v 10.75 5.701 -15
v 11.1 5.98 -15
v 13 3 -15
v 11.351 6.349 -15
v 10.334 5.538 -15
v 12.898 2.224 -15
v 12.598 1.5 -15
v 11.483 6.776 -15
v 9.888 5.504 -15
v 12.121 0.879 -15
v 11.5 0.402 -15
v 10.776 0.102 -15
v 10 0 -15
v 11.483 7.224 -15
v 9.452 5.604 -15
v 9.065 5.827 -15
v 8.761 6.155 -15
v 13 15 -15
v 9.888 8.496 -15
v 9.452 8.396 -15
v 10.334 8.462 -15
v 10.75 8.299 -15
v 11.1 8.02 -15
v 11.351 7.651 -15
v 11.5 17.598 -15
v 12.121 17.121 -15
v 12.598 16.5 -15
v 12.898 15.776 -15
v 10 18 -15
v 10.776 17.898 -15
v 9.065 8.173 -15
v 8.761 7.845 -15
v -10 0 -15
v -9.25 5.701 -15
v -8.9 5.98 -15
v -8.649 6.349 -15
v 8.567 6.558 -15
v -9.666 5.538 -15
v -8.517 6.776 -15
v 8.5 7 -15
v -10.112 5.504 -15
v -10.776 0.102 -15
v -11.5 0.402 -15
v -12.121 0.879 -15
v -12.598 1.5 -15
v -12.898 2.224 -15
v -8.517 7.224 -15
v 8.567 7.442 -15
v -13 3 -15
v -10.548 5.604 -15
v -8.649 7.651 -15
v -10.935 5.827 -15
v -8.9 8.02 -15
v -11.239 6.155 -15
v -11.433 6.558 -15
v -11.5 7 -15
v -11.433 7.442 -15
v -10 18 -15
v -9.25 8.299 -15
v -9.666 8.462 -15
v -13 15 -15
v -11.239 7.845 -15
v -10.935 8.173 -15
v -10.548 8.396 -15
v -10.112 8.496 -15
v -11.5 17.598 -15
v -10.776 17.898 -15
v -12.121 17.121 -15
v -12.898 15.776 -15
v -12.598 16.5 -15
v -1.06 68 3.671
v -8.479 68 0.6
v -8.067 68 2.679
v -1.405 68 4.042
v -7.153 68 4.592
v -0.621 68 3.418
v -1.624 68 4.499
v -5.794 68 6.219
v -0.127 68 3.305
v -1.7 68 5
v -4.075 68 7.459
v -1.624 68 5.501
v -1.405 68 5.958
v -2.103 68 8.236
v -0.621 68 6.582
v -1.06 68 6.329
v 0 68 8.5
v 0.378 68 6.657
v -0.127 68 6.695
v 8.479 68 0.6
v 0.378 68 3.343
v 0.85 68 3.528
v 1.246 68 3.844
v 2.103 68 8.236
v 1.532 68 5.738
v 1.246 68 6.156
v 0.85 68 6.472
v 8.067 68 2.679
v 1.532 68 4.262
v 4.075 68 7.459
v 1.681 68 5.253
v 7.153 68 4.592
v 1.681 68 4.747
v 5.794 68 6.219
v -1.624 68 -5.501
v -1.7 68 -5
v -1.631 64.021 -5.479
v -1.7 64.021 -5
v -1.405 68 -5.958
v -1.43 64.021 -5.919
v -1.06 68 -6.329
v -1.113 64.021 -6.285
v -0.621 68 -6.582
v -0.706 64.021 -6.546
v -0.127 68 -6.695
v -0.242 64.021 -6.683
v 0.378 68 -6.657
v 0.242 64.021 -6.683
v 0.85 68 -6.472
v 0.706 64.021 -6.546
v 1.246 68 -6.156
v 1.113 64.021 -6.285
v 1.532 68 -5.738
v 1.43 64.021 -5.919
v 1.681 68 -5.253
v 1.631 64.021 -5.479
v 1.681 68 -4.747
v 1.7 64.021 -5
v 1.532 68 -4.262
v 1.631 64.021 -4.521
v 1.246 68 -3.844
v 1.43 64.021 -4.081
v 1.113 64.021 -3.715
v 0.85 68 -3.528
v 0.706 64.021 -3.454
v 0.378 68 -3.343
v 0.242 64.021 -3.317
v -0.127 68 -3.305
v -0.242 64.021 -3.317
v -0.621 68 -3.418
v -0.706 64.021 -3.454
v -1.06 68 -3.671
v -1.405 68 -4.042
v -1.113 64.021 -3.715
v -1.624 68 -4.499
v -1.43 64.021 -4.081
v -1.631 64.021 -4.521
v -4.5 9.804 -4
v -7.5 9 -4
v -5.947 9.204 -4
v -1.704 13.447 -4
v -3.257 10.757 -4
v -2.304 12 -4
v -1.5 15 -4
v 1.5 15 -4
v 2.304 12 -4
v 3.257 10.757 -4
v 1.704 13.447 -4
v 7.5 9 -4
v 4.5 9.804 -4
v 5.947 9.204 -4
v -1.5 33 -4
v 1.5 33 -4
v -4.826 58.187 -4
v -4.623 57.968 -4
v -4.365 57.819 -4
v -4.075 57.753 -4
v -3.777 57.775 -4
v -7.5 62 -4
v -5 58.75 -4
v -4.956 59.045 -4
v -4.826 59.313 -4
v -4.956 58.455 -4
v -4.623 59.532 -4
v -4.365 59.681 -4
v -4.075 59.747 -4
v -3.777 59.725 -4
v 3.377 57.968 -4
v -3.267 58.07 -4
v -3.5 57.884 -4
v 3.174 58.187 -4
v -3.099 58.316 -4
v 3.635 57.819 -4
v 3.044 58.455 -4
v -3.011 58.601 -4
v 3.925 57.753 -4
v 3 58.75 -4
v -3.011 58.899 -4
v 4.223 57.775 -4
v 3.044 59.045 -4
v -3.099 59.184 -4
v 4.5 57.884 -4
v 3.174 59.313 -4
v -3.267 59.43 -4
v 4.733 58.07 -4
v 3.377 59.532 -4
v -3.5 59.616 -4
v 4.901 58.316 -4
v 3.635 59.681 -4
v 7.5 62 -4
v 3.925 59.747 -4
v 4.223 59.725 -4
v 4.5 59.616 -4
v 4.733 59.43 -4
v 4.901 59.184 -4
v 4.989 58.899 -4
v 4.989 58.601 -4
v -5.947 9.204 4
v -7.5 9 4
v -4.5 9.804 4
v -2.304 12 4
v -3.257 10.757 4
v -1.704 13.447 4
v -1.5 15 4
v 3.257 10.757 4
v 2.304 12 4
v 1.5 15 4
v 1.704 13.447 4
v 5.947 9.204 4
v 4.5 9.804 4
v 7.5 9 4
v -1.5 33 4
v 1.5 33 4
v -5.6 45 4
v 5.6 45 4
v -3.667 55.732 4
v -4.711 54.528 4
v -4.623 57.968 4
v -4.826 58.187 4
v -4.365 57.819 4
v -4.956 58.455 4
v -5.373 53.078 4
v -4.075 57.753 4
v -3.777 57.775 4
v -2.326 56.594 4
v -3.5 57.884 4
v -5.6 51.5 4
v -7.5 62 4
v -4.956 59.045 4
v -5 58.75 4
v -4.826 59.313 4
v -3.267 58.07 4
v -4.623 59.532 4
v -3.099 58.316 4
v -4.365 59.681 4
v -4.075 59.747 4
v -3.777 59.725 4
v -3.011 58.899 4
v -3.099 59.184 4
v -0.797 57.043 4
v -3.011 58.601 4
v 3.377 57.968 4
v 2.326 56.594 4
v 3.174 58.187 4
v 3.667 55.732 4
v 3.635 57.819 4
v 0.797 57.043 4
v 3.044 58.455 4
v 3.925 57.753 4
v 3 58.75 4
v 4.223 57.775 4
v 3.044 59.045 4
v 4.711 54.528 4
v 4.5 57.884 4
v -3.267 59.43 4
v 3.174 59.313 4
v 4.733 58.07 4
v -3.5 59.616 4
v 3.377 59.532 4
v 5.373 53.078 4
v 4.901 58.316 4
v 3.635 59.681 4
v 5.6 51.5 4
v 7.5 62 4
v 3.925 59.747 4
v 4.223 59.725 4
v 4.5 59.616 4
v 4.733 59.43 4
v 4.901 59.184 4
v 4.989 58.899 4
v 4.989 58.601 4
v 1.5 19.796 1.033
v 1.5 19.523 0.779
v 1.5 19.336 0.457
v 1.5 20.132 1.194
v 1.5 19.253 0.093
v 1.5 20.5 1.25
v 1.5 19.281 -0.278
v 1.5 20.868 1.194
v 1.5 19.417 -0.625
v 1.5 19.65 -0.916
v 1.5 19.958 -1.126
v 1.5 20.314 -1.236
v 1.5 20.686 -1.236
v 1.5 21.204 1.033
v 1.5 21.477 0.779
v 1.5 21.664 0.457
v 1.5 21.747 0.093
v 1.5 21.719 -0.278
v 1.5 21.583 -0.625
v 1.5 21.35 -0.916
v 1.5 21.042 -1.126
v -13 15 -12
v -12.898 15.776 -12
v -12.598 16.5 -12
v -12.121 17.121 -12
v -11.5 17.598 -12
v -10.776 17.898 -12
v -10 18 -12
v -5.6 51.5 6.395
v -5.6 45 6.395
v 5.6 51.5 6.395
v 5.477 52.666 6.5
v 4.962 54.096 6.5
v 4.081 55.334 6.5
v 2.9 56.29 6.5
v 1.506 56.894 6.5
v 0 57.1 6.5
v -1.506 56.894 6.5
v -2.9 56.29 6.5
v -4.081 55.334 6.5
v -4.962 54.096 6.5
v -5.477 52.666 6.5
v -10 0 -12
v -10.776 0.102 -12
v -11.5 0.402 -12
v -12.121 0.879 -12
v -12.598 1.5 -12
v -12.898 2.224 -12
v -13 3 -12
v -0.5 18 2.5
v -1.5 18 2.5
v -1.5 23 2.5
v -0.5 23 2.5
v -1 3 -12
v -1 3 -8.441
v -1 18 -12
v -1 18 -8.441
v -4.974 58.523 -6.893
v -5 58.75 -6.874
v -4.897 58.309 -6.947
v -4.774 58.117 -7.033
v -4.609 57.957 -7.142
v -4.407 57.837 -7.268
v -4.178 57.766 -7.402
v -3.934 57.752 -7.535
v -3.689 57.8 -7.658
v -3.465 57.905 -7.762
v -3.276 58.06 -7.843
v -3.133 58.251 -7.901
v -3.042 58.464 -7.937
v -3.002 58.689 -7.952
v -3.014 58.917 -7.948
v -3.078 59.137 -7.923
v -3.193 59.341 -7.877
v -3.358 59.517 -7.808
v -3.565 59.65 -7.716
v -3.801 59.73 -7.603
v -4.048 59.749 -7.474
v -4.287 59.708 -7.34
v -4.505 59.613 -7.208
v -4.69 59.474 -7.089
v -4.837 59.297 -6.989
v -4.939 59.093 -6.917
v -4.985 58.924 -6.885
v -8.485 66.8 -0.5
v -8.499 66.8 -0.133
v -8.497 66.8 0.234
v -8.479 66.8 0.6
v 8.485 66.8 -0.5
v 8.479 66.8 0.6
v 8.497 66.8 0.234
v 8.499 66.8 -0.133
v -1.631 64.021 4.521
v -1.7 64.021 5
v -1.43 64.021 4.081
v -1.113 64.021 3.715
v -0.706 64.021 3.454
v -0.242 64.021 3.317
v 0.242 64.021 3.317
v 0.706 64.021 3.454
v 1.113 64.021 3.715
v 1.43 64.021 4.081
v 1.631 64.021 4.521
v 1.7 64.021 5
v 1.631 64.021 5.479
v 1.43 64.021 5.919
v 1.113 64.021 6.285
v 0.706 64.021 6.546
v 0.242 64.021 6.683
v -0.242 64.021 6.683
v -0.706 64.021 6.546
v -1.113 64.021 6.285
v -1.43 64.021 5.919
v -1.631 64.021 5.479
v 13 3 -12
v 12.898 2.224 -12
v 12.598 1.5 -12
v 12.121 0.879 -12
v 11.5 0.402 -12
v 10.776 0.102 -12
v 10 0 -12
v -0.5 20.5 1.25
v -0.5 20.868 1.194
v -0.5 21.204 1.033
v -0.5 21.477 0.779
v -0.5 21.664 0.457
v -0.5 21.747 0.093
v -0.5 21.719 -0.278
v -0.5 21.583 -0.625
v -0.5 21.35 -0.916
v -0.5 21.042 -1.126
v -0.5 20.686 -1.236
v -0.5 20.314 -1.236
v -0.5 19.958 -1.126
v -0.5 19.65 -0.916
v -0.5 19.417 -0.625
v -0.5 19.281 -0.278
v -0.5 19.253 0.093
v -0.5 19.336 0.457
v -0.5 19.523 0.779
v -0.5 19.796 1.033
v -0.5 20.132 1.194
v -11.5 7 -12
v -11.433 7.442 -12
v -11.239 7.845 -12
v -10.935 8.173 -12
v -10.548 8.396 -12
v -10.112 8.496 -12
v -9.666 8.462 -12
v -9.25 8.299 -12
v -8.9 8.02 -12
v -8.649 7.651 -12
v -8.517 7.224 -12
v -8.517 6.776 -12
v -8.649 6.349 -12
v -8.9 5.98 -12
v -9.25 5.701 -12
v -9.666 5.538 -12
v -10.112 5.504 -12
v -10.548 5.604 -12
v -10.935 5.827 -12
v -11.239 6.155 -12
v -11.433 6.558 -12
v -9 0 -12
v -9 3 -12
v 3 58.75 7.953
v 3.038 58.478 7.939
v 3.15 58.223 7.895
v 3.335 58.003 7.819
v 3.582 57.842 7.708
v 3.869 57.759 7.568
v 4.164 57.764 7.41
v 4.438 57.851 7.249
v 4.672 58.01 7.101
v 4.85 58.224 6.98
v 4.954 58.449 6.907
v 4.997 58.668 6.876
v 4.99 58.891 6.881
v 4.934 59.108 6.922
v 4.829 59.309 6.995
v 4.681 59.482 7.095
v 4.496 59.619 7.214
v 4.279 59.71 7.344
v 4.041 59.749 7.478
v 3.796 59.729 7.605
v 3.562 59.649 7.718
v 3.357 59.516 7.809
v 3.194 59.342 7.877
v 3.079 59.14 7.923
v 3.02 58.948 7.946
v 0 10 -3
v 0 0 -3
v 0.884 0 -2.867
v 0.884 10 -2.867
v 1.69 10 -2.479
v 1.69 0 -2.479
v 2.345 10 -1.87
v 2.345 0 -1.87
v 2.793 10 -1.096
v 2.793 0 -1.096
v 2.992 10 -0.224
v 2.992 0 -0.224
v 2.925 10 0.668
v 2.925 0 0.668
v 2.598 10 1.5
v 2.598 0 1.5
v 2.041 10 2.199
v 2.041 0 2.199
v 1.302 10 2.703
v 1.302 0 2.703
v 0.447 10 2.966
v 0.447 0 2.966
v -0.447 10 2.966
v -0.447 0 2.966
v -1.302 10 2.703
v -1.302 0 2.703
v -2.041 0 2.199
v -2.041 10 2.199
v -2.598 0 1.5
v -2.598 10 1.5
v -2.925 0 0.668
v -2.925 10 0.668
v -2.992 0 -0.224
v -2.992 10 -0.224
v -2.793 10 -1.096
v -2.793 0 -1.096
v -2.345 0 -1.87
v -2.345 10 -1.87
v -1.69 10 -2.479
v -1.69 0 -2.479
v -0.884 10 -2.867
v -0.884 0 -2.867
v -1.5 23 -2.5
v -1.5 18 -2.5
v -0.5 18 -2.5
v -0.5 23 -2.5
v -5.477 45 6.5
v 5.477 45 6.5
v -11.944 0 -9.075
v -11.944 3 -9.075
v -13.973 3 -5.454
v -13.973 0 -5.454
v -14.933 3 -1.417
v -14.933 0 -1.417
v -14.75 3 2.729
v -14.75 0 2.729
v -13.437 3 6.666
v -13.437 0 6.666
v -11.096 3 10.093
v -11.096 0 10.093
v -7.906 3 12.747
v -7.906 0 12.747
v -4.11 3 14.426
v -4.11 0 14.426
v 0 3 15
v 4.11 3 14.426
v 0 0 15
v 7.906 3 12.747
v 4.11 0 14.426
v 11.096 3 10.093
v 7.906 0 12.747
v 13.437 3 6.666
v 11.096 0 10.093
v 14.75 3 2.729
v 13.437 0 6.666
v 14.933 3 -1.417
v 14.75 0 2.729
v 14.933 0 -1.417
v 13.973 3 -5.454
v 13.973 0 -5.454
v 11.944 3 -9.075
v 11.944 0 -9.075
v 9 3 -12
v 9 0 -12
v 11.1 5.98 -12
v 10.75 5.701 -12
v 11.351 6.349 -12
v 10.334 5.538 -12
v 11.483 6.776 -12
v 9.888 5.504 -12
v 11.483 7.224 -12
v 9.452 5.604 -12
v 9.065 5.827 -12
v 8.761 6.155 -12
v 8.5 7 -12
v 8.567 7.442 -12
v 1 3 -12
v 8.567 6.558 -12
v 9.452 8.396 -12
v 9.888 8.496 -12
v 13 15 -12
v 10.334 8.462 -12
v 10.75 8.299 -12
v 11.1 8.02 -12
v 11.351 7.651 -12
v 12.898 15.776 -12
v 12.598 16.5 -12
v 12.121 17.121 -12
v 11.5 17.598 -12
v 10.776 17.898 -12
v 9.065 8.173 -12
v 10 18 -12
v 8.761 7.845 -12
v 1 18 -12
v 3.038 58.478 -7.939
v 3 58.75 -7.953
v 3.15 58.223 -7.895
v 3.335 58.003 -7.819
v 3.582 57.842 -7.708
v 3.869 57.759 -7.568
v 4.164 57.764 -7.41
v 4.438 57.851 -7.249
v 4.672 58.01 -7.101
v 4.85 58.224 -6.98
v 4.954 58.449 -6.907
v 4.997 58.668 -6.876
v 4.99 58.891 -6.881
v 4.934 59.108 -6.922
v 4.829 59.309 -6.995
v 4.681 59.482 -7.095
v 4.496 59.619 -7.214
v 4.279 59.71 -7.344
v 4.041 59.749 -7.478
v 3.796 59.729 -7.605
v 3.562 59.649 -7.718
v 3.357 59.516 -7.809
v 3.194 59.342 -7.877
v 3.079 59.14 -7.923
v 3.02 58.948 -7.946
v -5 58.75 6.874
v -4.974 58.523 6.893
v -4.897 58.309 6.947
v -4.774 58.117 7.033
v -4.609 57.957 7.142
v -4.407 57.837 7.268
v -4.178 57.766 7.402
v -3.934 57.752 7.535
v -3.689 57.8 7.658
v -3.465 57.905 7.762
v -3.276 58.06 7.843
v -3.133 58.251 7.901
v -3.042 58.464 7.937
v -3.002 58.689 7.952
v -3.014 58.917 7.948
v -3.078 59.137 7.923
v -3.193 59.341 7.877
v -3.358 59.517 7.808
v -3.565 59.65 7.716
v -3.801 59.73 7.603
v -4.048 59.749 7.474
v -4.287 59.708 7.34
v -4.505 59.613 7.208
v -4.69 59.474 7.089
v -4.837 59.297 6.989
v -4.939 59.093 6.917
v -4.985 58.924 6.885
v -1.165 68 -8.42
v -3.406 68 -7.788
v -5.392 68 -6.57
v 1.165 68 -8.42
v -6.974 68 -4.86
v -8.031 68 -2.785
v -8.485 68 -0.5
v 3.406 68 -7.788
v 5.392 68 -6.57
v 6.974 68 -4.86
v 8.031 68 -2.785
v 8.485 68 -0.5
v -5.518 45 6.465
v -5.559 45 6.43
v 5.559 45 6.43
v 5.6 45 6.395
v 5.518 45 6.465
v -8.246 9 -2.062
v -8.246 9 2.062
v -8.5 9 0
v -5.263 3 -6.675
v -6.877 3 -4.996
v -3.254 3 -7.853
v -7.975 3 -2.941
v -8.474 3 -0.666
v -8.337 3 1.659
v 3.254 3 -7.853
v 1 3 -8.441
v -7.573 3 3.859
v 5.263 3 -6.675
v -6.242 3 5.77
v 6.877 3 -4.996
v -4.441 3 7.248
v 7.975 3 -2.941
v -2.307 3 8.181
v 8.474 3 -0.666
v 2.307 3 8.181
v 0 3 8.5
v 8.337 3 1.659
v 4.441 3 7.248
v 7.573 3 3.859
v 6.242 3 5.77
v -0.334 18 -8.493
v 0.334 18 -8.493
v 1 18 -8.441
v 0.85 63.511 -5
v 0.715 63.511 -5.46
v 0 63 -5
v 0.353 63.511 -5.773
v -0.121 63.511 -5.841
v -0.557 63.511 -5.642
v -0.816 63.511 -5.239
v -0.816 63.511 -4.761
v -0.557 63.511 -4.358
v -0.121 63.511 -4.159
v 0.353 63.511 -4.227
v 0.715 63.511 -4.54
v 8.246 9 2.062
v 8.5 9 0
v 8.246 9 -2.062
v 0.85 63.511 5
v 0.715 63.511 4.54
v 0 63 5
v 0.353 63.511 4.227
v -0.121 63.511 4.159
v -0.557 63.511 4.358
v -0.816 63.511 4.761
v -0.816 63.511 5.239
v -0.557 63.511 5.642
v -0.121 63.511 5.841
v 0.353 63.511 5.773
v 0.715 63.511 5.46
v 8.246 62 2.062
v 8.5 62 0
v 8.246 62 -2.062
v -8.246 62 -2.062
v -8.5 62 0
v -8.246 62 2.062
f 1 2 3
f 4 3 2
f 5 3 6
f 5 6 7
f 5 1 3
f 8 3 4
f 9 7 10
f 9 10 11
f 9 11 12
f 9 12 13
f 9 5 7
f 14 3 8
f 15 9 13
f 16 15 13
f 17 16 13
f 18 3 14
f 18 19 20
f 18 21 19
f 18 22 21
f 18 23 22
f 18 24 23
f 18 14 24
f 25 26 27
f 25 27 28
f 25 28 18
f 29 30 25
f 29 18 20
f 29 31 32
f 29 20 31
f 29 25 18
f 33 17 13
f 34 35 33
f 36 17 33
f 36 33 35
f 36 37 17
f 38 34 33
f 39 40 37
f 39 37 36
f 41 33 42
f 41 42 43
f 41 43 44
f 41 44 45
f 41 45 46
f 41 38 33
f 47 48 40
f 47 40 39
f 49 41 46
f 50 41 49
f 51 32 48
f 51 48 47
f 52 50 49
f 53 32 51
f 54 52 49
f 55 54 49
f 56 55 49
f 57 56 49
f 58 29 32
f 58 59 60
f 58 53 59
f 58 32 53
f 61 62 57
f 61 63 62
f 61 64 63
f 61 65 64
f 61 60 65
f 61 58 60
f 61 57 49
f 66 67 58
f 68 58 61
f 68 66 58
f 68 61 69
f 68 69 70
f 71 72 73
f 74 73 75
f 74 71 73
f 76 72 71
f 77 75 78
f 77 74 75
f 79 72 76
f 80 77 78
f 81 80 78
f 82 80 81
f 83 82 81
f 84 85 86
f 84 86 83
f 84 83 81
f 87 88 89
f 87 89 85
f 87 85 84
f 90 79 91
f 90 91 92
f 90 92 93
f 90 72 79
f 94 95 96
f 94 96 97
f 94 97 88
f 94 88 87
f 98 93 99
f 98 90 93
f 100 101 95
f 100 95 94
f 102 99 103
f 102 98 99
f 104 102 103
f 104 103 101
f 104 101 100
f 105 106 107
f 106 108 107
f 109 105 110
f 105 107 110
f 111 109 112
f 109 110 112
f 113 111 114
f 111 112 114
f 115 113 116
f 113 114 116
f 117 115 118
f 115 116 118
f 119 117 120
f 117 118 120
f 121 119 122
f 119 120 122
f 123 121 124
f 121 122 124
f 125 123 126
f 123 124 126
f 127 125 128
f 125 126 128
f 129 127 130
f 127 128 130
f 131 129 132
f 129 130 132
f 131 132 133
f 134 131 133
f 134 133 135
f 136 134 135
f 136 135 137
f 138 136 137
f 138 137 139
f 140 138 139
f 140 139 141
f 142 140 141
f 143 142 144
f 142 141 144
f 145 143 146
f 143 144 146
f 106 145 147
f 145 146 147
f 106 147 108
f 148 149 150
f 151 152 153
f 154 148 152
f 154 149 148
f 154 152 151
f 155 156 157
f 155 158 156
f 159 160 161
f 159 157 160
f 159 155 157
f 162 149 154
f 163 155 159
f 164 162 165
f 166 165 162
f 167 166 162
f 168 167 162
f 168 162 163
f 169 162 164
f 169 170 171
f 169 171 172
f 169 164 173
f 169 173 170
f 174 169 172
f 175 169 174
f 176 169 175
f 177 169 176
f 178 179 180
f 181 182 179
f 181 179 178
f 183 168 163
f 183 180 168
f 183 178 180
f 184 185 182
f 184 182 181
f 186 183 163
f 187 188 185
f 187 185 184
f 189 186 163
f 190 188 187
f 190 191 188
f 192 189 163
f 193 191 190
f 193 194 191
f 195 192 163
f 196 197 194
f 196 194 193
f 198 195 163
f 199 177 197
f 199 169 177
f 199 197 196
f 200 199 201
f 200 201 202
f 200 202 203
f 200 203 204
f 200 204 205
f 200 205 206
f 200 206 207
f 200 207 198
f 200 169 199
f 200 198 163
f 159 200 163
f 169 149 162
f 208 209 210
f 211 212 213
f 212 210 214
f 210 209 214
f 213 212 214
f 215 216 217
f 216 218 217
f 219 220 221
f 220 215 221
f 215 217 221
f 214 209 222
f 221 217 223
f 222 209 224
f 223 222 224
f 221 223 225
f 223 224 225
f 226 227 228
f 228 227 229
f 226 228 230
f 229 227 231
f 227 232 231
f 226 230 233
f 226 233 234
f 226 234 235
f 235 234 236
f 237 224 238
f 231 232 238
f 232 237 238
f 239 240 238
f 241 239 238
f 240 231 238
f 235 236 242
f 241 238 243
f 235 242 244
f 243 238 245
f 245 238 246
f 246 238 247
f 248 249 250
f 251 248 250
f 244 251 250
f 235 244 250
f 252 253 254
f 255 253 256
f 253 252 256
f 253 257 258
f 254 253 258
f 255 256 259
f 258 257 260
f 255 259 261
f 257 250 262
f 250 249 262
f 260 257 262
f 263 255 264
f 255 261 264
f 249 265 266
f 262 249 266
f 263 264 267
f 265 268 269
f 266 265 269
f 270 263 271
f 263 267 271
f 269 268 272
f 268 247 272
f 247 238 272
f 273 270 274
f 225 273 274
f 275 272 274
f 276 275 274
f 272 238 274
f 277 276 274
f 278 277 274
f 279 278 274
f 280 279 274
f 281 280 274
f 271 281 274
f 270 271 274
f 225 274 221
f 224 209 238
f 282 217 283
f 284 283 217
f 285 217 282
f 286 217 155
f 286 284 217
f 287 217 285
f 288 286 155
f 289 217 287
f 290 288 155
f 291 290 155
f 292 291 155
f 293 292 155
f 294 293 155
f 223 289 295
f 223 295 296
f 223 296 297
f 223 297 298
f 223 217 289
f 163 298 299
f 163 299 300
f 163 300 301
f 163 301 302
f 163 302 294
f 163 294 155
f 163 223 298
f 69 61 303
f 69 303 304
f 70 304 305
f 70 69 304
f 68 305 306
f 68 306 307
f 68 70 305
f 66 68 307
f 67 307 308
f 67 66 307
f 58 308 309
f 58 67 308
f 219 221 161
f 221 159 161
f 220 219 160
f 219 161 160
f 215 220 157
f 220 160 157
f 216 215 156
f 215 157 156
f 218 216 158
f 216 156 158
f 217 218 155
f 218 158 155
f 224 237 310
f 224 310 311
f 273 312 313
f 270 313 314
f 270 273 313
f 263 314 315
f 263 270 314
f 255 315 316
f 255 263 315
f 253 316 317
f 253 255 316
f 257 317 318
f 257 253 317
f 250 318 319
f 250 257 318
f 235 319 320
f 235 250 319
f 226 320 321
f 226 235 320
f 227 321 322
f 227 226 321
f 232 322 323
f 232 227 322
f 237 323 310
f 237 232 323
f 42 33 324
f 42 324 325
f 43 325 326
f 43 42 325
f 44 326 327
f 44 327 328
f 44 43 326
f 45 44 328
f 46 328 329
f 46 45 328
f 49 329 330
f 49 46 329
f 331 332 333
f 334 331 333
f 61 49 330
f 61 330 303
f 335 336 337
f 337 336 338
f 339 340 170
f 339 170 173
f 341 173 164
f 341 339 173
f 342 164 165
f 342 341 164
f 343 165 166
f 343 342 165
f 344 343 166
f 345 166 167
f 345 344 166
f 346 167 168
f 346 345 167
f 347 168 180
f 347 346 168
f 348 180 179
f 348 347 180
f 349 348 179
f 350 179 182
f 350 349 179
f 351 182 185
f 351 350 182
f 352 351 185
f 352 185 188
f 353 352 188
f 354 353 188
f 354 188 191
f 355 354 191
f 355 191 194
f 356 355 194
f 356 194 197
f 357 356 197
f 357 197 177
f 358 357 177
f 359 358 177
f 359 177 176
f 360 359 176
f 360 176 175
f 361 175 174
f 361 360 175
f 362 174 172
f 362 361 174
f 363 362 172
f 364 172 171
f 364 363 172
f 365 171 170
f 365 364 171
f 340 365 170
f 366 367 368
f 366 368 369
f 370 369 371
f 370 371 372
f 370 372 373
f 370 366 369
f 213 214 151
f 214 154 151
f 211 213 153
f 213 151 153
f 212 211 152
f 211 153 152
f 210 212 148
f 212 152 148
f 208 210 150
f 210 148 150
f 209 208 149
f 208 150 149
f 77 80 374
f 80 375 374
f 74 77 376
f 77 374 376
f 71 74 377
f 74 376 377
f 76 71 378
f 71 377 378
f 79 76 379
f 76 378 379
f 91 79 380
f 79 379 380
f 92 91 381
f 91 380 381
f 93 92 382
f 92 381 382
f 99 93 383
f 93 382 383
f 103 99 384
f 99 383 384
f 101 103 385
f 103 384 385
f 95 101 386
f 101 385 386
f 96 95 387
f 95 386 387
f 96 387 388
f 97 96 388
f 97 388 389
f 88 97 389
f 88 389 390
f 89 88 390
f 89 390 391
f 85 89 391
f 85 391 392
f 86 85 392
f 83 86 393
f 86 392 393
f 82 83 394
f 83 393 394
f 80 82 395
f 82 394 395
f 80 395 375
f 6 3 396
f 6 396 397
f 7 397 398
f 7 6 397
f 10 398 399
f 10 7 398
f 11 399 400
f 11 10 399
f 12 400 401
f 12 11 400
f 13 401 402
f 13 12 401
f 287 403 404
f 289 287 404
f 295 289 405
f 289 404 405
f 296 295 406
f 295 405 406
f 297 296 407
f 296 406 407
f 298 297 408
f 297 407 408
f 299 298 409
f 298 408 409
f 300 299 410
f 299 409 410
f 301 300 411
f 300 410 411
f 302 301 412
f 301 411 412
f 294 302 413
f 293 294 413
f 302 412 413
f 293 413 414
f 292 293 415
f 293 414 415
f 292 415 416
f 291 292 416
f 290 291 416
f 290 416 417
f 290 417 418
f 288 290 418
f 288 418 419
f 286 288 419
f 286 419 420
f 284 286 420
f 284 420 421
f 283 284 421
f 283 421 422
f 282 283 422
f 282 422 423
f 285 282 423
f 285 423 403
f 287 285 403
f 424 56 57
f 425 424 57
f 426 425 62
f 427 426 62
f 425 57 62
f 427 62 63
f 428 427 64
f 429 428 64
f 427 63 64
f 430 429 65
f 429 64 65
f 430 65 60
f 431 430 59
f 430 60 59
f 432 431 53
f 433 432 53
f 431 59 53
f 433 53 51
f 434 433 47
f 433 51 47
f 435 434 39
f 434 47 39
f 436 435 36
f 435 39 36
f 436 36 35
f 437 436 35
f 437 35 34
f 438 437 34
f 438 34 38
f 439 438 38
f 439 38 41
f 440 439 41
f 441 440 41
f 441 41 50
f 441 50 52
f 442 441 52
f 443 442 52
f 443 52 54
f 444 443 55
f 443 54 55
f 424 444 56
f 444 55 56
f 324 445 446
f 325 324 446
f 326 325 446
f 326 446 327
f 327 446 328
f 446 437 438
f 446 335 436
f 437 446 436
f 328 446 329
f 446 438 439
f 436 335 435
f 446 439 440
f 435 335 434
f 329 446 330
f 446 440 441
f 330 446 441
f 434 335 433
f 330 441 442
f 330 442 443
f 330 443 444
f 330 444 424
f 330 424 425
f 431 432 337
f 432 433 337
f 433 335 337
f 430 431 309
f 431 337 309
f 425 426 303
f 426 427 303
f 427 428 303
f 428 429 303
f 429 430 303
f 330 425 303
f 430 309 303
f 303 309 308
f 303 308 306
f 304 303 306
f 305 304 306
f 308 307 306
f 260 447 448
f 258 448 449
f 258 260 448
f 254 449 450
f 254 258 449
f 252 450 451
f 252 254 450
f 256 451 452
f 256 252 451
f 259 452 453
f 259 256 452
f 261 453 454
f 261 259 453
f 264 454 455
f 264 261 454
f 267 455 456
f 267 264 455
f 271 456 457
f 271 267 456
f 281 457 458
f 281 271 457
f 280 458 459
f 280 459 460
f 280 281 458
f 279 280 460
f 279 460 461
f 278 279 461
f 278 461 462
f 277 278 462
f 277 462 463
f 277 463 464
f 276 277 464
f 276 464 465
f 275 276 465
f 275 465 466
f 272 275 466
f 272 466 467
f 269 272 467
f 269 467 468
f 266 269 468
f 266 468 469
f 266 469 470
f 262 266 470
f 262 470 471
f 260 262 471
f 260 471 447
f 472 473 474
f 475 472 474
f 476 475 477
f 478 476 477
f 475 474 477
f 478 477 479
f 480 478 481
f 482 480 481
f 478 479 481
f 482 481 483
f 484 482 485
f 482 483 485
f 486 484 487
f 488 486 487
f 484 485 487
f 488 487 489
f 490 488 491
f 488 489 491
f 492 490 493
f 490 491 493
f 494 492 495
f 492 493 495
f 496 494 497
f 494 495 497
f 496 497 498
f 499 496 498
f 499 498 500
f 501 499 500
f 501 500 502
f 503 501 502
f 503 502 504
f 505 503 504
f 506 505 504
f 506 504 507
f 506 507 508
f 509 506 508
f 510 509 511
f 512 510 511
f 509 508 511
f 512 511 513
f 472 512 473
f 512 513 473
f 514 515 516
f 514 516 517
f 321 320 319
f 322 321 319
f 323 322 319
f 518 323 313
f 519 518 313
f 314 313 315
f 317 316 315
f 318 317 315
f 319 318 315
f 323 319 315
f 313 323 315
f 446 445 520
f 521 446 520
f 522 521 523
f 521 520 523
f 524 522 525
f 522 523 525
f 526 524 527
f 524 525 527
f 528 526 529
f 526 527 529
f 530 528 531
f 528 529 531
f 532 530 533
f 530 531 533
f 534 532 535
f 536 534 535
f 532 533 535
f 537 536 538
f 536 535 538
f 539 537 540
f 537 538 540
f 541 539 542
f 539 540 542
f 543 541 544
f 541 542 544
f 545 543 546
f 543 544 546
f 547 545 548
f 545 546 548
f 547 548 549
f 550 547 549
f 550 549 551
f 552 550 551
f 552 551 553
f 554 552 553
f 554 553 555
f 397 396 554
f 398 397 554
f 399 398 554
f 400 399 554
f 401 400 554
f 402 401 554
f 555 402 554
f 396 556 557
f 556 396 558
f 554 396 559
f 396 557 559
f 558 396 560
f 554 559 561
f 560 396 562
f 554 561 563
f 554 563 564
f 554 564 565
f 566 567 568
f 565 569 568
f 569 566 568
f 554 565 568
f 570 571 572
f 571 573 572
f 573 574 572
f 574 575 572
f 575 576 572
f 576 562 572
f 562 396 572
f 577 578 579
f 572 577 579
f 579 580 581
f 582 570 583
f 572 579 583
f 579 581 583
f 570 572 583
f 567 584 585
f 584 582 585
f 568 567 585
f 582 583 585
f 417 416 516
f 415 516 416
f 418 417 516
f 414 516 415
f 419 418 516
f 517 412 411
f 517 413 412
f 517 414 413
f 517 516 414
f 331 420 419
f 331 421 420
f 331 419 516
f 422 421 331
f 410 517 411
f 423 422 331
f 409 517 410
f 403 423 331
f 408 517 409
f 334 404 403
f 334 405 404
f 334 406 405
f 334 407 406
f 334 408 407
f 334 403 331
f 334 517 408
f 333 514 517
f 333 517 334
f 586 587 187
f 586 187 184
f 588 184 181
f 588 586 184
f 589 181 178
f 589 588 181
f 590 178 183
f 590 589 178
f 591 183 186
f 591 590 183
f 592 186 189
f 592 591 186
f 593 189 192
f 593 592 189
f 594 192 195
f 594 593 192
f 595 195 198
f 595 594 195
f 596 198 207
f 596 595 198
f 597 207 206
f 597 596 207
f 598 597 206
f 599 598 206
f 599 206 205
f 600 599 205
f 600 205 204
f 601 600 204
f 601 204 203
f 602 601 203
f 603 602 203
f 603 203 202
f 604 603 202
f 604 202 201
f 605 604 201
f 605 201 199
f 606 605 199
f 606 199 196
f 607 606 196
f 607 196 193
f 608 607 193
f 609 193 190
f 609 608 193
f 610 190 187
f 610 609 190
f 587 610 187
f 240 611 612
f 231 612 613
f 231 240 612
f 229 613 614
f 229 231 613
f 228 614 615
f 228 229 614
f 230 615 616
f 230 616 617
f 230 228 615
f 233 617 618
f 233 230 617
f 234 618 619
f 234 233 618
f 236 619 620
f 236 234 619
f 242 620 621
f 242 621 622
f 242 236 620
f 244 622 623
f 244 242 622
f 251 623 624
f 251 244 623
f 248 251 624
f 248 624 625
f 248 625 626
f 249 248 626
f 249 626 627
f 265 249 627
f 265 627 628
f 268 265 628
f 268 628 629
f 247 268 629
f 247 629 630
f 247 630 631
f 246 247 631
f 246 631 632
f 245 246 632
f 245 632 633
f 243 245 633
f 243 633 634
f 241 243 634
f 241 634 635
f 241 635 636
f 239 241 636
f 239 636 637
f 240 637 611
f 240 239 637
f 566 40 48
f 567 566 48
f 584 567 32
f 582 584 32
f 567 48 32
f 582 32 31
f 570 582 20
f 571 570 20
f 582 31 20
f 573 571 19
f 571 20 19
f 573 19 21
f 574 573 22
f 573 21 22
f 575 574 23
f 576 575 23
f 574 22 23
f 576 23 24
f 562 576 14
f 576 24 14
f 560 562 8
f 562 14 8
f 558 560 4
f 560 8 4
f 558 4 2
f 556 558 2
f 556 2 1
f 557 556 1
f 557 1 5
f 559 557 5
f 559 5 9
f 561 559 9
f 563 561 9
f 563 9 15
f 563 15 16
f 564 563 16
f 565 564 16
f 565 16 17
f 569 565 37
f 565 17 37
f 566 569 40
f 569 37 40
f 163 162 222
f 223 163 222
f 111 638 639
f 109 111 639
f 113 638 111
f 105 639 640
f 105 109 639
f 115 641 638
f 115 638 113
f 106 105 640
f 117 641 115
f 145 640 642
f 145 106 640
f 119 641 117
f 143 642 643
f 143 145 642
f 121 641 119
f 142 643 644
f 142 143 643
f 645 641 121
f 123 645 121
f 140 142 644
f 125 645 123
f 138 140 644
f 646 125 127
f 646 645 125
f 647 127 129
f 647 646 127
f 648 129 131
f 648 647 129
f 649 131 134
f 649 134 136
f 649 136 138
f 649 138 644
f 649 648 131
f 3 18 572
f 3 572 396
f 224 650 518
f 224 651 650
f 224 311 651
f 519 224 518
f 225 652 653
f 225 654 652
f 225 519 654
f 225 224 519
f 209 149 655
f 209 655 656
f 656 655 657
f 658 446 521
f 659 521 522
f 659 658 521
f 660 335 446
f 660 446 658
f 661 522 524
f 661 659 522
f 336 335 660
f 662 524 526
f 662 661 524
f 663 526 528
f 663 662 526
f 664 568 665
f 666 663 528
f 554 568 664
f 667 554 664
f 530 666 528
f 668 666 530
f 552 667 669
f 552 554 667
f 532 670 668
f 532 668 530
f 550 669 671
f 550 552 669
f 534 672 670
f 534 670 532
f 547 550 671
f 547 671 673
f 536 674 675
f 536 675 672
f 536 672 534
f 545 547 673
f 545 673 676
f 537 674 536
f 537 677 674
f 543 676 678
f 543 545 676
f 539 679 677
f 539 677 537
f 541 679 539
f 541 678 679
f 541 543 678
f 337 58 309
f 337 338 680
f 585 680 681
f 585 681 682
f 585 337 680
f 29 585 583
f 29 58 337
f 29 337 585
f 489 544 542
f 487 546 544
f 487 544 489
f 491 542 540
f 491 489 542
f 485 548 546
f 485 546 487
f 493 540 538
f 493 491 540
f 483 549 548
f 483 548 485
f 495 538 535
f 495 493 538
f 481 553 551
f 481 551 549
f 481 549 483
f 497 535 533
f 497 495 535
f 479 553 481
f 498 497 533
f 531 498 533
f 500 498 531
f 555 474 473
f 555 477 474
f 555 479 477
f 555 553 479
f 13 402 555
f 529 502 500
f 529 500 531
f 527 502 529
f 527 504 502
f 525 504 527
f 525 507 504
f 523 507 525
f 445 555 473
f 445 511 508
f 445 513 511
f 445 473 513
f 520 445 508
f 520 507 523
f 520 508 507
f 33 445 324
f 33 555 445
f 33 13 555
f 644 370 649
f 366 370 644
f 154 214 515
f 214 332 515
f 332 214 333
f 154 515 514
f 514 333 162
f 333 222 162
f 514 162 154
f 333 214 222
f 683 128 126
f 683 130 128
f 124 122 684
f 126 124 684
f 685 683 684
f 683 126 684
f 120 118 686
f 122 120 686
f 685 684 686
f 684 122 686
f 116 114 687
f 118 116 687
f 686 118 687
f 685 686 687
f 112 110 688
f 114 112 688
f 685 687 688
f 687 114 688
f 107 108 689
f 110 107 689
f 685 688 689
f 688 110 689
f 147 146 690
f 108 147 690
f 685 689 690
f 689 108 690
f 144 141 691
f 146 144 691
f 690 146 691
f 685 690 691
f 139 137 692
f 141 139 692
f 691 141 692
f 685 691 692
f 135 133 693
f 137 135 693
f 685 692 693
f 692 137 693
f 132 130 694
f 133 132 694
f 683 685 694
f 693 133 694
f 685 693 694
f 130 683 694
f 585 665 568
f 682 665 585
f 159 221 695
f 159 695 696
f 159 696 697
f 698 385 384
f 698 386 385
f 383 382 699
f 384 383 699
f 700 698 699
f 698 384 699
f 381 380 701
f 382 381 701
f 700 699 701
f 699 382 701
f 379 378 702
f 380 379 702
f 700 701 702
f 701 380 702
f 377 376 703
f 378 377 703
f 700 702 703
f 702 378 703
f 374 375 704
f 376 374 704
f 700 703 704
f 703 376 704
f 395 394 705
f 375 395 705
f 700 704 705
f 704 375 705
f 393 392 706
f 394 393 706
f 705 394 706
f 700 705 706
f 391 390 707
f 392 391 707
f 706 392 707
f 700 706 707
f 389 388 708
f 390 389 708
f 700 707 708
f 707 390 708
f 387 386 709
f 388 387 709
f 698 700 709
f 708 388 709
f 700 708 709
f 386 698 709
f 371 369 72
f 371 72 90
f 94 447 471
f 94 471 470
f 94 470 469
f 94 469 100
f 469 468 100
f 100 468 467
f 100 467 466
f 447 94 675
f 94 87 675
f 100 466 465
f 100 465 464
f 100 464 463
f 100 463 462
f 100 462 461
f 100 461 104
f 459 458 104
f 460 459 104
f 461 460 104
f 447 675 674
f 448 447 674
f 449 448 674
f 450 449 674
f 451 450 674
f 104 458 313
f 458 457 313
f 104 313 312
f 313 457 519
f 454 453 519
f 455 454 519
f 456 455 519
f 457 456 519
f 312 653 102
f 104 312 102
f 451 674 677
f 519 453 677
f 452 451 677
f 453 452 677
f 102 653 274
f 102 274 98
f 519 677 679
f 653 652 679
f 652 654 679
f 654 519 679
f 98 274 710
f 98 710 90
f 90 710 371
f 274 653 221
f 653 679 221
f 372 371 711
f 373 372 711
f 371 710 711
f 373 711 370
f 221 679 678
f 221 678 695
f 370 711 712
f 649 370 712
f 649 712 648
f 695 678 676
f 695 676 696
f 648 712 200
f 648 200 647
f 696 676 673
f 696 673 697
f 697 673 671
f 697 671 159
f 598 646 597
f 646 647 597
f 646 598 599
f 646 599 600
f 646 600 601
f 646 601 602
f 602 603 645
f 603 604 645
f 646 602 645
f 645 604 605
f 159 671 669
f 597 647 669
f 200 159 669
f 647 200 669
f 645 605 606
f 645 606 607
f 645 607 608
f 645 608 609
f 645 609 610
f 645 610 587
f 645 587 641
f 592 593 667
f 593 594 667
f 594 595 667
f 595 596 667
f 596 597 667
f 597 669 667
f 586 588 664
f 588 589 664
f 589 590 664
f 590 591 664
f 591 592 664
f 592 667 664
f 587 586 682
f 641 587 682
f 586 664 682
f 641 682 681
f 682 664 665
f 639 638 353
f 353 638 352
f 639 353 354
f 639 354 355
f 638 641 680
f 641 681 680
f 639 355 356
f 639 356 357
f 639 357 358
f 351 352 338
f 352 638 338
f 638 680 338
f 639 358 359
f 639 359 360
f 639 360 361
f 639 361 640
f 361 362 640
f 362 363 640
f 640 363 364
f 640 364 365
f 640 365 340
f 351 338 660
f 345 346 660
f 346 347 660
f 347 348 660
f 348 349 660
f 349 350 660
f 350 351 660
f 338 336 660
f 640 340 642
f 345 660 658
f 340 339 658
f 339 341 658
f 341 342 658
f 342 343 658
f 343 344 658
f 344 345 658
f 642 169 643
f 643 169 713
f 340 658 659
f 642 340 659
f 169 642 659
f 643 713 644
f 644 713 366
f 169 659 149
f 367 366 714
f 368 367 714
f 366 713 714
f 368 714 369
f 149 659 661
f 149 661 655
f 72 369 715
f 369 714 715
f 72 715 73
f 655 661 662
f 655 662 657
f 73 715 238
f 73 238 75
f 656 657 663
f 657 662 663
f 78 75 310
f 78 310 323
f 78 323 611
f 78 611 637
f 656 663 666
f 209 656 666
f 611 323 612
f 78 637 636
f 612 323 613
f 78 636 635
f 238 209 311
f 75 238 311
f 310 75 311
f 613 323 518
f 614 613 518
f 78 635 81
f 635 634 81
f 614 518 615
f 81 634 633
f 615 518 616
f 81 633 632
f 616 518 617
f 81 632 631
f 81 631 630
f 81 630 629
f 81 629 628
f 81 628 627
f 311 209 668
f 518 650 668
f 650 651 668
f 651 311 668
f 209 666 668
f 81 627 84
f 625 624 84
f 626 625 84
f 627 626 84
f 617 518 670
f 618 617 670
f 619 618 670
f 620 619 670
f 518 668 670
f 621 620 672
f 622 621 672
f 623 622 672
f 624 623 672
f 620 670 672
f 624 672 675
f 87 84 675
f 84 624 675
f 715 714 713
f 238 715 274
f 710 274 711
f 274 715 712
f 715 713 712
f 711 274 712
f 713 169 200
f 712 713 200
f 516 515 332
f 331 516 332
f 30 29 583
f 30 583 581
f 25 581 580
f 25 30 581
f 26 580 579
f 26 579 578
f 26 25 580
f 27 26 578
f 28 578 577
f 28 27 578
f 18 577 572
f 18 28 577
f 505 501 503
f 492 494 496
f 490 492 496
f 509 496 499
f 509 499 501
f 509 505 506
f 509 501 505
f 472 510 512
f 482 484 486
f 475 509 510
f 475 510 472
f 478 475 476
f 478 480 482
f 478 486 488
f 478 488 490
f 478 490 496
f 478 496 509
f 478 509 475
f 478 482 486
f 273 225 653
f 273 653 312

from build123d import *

# Parameters (mm, degrees)
CROQUIS1_R                   = 15
SALIENTE_EXTRUIR1_DEPTH      = 3
CROQUIS2_R                   = 8.5
SALIENTE_EXTRUIR2_DEPTH      = 65
CORTAR_EXTRUIR1_DEPTH        = 4
CORTAR_EXTRUIR1_DEPTH_BACK   = 4
CROQUIS3_W                   = 17
CROQUIS3_H                   = 53
CORTAR_EXTRUIR2_DEPTH        = 8
CORTAR_EXTRUIR2_DEPTH_BACK   = 8
CROQUIS4_R                   = 1
CUT_EXTRUDE9_DEPTH           = 2.5
CROQUIS5_W                   = 2
CROQUIS5_H                   = 15
SALIENTE_EXTRUIR3_DEPTH      = 15
CROQUIS6_R                   = 1.5
SALIENTE_EXTRUIR4_DEPTH      = 3
SALIENTE_EXTRUIR5_DEPTH      = 1.5
SALIENTE_EXTRUIR5_DEPTH_BACK = 1.5
REDONDEO2_R                  = 6
CROQUIS8_R                   = 3
CORTAR_EXTRUIR3_DEPTH        = 10
SKETCH1_W                    = 5
SKETCH1_H                    = 5
CUT_EXTRUDE1_DEPTH           = 1
SKETCH2_R                    = 1.25
CUT_EXTRUDE2_DEPTH           = 3
CUT_EXTRUDE10_START          = -1.2
CUT_EXTRUDE10_DEPTH          = 1.2
M3_CLEARANCE_HOLE1_D         = 3.4
M3_CLEARANCE_HOLE1_DEPTH     = 3.978536948
M3_CLEARANCE_HOLE1_TIP       = 1.021463052


with BuildPart() as part:
    # Croquis1 → Saliente-Extruir1 (new body)
    with BuildSketch(Plane(origin=(0, 0, 0), x_dir=(1, 0, 0), z_dir=(0, 1, 0))):
        Circle(CROQUIS1_R)
    extrude(amount=SALIENTE_EXTRUIR1_DEPTH)

    # Croquis2 → Saliente-Extruir2 (add)
    with BuildSketch(Plane(origin=(0, 3, 0), x_dir=(1, 0, 0), z_dir=(0, 1, 0))):
        Circle(CROQUIS2_R)
    extrude(amount=SALIENTE_EXTRUIR2_DEPTH)

    # Croquis3 → Cortar-Extruir1 (cut, two sides: drawn at the far end of the back side and taken through both)
    with BuildSketch(Plane.XY.offset(-CORTAR_EXTRUIR1_DEPTH_BACK)):
        with Locations((0, 35.5)):
            Rectangle(CROQUIS3_W, CROQUIS3_H)
    extrude(amount=CORTAR_EXTRUIR1_DEPTH + CORTAR_EXTRUIR1_DEPTH_BACK, mode=Mode.SUBTRACT)

    # Croquis4 → Cortar-Extruir2 (cut, two sides: drawn at the far end of the back side and taken through both)
    with BuildSketch(Plane.XY.offset(-CORTAR_EXTRUIR2_DEPTH_BACK)):
        with Locations((-4, 58.75)):
            Circle(CROQUIS4_R)
        with Locations((4, 58.75)):
            Circle(CROQUIS4_R)
    extrude(amount=CORTAR_EXTRUIR2_DEPTH + CORTAR_EXTRUIR2_DEPTH_BACK, mode=Mode.SUBTRACT)

    # Sketch11 → Cut-Extrude9 (cut)
    with BuildSketch(Plane(origin=(0, 0, 4), x_dir=(-1, 0, 0), z_dir=(0, 0, -1))):
        with BuildLine():
            Line((5.6, 51.5), (5.6, 45))
            Line((5.6, 45), (-5.6, 45))
            Line((-5.6, 45), (-5.6, 51.5))
            ThreePointArc((-5.6, 51.5), (0, 57.1), (5.6, 51.5))
        make_face()
    extrude(amount=-CUT_EXTRUDE9_DEPTH, mode=Mode.SUBTRACT)

    # Croquis5 → Saliente-Extruir3 (add)
    with BuildSketch(Plane.XY):
        with Locations((0, 10.5)):
            Rectangle(CROQUIS5_W, CROQUIS5_H)
    extrude(amount=-SALIENTE_EXTRUIR3_DEPTH)

    # Croquis6 → Saliente-Extruir4 (add)
    with BuildSketch(Plane(origin=(0, 0, -15), x_dir=(-1, 0, 0), z_dir=(0, 0, -1))):
        with BuildLine():
            Line((-10, 0), (10, 0))
            ThreePointArc((10, 0), (12.121320344, 0.878679656), (13, 3))
            Line((13, 3), (13, 15))
            ThreePointArc((13, 15), (12.121320344, 17.121320344), (10, 18))
            Line((10, 18), (-10, 18))
            ThreePointArc((-10, 18), (-12.121320344, 17.121320344), (-13, 15))
            Line((-13, 15), (-13, 3))
            ThreePointArc((-13, 3), (-12.121320344, 0.878679656), (-10, 0))
        make_face()
        with Locations((-10, 7)):
            Circle(CROQUIS6_R, mode=Mode.SUBTRACT)
        with Locations((10, 7)):
            Circle(CROQUIS6_R, mode=Mode.SUBTRACT)
    extrude(amount=-SALIENTE_EXTRUIR4_DEPTH)

    # Croquis7 → Saliente-Extruir5 (add, two sides: drawn at the far end of the back side and taken through both)
    with BuildSketch(Plane(origin=(0, 0, 0), x_dir=(0, 0, -1), z_dir=(1, 0, 0)).offset(-SALIENTE_EXTRUIR5_DEPTH_BACK)):
        Polygon((0, 9), (4, 9), (4, 33), (-4, 33), (-4, 9), align=None)
    extrude(amount=SALIENTE_EXTRUIR5_DEPTH + SALIENTE_EXTRUIR5_DEPTH_BACK)

    # Redondeo2
    redondeo2_edges = [part.edges().sort_by_distance(p)[0] for p in [
        (-1.5, 9, 0),
        (1.5, 9, 0),
    ]]
    fillet(redondeo2_edges, radius=REDONDEO2_R)

    # Croquis8 → Cortar-Extruir3 (cut)
    with BuildSketch(Plane.XZ):
        Circle(CROQUIS8_R)
    extrude(amount=-CORTAR_EXTRUIR3_DEPTH, mode=Mode.SUBTRACT)

    # Sketch1 → Cut-Extrude1 (cut)
    with BuildSketch(Plane.ZY.offset(1.5)):
        with Locations((0, 20.5)):
            Rectangle(SKETCH1_W, SKETCH1_H)
    extrude(amount=-CUT_EXTRUDE1_DEPTH, mode=Mode.SUBTRACT)

    # Sketch2 → Cut-Extrude2 (cut)
    with BuildSketch(Plane.ZY.offset(0.5)):
        with Locations((0, 20.5)):
            Circle(SKETCH2_R)
    extrude(amount=-CUT_EXTRUDE2_DEPTH, mode=Mode.SUBTRACT)

    # Sketch12 → Cut-Extrude10 (cut)
    with BuildSketch(Plane(origin=(0, 68, 0), x_dir=(1, 0, 0), z_dir=(0, 1, 0)).offset(CUT_EXTRUDE10_START)):
        with BuildLine():
            Line((0, 0.499987676), (-8.4852821, 0.499987676))
            ThreePointArc((-8.4852821, 0.499987676), (-8.499852285, -0.050111177), (-8.478797084, -0.6))
            Line((-8.478797084, -0.6), (0, -0.6))
            Line((0, -0.6), (8.478797084, -0.6))
            ThreePointArc((8.478797084, -0.6), (8.499852285, -0.050111177), (8.4852821, 0.499987676))
            Line((8.4852821, 0.499987676), (0, 0.499987676))
        make_face()
    extrude(amount=CUT_EXTRUDE10_DEPTH, mode=Mode.SUBTRACT)

    # M3 Clearance Hole1
    with Locations(Plane(origin=(0, 68, 0), x_dir=(1, 0, 0), z_dir=(0, 1, 0))):
        with Locations((0, 5), (0, -5)):
            Hole(M3_CLEARANCE_HOLE1_D / 2, depth=M3_CLEARANCE_HOLE1_DEPTH)
            with Locations((0, 0, -(M3_CLEARANCE_HOLE1_DEPTH + M3_CLEARANCE_HOLE1_TIP / 2))):  # 118° drill point
                Cone(0, M3_CLEARANCE_HOLE1_D / 2, M3_CLEARANCE_HOLE1_TIP, mode=Mode.SUBTRACT)


solid = part.part
